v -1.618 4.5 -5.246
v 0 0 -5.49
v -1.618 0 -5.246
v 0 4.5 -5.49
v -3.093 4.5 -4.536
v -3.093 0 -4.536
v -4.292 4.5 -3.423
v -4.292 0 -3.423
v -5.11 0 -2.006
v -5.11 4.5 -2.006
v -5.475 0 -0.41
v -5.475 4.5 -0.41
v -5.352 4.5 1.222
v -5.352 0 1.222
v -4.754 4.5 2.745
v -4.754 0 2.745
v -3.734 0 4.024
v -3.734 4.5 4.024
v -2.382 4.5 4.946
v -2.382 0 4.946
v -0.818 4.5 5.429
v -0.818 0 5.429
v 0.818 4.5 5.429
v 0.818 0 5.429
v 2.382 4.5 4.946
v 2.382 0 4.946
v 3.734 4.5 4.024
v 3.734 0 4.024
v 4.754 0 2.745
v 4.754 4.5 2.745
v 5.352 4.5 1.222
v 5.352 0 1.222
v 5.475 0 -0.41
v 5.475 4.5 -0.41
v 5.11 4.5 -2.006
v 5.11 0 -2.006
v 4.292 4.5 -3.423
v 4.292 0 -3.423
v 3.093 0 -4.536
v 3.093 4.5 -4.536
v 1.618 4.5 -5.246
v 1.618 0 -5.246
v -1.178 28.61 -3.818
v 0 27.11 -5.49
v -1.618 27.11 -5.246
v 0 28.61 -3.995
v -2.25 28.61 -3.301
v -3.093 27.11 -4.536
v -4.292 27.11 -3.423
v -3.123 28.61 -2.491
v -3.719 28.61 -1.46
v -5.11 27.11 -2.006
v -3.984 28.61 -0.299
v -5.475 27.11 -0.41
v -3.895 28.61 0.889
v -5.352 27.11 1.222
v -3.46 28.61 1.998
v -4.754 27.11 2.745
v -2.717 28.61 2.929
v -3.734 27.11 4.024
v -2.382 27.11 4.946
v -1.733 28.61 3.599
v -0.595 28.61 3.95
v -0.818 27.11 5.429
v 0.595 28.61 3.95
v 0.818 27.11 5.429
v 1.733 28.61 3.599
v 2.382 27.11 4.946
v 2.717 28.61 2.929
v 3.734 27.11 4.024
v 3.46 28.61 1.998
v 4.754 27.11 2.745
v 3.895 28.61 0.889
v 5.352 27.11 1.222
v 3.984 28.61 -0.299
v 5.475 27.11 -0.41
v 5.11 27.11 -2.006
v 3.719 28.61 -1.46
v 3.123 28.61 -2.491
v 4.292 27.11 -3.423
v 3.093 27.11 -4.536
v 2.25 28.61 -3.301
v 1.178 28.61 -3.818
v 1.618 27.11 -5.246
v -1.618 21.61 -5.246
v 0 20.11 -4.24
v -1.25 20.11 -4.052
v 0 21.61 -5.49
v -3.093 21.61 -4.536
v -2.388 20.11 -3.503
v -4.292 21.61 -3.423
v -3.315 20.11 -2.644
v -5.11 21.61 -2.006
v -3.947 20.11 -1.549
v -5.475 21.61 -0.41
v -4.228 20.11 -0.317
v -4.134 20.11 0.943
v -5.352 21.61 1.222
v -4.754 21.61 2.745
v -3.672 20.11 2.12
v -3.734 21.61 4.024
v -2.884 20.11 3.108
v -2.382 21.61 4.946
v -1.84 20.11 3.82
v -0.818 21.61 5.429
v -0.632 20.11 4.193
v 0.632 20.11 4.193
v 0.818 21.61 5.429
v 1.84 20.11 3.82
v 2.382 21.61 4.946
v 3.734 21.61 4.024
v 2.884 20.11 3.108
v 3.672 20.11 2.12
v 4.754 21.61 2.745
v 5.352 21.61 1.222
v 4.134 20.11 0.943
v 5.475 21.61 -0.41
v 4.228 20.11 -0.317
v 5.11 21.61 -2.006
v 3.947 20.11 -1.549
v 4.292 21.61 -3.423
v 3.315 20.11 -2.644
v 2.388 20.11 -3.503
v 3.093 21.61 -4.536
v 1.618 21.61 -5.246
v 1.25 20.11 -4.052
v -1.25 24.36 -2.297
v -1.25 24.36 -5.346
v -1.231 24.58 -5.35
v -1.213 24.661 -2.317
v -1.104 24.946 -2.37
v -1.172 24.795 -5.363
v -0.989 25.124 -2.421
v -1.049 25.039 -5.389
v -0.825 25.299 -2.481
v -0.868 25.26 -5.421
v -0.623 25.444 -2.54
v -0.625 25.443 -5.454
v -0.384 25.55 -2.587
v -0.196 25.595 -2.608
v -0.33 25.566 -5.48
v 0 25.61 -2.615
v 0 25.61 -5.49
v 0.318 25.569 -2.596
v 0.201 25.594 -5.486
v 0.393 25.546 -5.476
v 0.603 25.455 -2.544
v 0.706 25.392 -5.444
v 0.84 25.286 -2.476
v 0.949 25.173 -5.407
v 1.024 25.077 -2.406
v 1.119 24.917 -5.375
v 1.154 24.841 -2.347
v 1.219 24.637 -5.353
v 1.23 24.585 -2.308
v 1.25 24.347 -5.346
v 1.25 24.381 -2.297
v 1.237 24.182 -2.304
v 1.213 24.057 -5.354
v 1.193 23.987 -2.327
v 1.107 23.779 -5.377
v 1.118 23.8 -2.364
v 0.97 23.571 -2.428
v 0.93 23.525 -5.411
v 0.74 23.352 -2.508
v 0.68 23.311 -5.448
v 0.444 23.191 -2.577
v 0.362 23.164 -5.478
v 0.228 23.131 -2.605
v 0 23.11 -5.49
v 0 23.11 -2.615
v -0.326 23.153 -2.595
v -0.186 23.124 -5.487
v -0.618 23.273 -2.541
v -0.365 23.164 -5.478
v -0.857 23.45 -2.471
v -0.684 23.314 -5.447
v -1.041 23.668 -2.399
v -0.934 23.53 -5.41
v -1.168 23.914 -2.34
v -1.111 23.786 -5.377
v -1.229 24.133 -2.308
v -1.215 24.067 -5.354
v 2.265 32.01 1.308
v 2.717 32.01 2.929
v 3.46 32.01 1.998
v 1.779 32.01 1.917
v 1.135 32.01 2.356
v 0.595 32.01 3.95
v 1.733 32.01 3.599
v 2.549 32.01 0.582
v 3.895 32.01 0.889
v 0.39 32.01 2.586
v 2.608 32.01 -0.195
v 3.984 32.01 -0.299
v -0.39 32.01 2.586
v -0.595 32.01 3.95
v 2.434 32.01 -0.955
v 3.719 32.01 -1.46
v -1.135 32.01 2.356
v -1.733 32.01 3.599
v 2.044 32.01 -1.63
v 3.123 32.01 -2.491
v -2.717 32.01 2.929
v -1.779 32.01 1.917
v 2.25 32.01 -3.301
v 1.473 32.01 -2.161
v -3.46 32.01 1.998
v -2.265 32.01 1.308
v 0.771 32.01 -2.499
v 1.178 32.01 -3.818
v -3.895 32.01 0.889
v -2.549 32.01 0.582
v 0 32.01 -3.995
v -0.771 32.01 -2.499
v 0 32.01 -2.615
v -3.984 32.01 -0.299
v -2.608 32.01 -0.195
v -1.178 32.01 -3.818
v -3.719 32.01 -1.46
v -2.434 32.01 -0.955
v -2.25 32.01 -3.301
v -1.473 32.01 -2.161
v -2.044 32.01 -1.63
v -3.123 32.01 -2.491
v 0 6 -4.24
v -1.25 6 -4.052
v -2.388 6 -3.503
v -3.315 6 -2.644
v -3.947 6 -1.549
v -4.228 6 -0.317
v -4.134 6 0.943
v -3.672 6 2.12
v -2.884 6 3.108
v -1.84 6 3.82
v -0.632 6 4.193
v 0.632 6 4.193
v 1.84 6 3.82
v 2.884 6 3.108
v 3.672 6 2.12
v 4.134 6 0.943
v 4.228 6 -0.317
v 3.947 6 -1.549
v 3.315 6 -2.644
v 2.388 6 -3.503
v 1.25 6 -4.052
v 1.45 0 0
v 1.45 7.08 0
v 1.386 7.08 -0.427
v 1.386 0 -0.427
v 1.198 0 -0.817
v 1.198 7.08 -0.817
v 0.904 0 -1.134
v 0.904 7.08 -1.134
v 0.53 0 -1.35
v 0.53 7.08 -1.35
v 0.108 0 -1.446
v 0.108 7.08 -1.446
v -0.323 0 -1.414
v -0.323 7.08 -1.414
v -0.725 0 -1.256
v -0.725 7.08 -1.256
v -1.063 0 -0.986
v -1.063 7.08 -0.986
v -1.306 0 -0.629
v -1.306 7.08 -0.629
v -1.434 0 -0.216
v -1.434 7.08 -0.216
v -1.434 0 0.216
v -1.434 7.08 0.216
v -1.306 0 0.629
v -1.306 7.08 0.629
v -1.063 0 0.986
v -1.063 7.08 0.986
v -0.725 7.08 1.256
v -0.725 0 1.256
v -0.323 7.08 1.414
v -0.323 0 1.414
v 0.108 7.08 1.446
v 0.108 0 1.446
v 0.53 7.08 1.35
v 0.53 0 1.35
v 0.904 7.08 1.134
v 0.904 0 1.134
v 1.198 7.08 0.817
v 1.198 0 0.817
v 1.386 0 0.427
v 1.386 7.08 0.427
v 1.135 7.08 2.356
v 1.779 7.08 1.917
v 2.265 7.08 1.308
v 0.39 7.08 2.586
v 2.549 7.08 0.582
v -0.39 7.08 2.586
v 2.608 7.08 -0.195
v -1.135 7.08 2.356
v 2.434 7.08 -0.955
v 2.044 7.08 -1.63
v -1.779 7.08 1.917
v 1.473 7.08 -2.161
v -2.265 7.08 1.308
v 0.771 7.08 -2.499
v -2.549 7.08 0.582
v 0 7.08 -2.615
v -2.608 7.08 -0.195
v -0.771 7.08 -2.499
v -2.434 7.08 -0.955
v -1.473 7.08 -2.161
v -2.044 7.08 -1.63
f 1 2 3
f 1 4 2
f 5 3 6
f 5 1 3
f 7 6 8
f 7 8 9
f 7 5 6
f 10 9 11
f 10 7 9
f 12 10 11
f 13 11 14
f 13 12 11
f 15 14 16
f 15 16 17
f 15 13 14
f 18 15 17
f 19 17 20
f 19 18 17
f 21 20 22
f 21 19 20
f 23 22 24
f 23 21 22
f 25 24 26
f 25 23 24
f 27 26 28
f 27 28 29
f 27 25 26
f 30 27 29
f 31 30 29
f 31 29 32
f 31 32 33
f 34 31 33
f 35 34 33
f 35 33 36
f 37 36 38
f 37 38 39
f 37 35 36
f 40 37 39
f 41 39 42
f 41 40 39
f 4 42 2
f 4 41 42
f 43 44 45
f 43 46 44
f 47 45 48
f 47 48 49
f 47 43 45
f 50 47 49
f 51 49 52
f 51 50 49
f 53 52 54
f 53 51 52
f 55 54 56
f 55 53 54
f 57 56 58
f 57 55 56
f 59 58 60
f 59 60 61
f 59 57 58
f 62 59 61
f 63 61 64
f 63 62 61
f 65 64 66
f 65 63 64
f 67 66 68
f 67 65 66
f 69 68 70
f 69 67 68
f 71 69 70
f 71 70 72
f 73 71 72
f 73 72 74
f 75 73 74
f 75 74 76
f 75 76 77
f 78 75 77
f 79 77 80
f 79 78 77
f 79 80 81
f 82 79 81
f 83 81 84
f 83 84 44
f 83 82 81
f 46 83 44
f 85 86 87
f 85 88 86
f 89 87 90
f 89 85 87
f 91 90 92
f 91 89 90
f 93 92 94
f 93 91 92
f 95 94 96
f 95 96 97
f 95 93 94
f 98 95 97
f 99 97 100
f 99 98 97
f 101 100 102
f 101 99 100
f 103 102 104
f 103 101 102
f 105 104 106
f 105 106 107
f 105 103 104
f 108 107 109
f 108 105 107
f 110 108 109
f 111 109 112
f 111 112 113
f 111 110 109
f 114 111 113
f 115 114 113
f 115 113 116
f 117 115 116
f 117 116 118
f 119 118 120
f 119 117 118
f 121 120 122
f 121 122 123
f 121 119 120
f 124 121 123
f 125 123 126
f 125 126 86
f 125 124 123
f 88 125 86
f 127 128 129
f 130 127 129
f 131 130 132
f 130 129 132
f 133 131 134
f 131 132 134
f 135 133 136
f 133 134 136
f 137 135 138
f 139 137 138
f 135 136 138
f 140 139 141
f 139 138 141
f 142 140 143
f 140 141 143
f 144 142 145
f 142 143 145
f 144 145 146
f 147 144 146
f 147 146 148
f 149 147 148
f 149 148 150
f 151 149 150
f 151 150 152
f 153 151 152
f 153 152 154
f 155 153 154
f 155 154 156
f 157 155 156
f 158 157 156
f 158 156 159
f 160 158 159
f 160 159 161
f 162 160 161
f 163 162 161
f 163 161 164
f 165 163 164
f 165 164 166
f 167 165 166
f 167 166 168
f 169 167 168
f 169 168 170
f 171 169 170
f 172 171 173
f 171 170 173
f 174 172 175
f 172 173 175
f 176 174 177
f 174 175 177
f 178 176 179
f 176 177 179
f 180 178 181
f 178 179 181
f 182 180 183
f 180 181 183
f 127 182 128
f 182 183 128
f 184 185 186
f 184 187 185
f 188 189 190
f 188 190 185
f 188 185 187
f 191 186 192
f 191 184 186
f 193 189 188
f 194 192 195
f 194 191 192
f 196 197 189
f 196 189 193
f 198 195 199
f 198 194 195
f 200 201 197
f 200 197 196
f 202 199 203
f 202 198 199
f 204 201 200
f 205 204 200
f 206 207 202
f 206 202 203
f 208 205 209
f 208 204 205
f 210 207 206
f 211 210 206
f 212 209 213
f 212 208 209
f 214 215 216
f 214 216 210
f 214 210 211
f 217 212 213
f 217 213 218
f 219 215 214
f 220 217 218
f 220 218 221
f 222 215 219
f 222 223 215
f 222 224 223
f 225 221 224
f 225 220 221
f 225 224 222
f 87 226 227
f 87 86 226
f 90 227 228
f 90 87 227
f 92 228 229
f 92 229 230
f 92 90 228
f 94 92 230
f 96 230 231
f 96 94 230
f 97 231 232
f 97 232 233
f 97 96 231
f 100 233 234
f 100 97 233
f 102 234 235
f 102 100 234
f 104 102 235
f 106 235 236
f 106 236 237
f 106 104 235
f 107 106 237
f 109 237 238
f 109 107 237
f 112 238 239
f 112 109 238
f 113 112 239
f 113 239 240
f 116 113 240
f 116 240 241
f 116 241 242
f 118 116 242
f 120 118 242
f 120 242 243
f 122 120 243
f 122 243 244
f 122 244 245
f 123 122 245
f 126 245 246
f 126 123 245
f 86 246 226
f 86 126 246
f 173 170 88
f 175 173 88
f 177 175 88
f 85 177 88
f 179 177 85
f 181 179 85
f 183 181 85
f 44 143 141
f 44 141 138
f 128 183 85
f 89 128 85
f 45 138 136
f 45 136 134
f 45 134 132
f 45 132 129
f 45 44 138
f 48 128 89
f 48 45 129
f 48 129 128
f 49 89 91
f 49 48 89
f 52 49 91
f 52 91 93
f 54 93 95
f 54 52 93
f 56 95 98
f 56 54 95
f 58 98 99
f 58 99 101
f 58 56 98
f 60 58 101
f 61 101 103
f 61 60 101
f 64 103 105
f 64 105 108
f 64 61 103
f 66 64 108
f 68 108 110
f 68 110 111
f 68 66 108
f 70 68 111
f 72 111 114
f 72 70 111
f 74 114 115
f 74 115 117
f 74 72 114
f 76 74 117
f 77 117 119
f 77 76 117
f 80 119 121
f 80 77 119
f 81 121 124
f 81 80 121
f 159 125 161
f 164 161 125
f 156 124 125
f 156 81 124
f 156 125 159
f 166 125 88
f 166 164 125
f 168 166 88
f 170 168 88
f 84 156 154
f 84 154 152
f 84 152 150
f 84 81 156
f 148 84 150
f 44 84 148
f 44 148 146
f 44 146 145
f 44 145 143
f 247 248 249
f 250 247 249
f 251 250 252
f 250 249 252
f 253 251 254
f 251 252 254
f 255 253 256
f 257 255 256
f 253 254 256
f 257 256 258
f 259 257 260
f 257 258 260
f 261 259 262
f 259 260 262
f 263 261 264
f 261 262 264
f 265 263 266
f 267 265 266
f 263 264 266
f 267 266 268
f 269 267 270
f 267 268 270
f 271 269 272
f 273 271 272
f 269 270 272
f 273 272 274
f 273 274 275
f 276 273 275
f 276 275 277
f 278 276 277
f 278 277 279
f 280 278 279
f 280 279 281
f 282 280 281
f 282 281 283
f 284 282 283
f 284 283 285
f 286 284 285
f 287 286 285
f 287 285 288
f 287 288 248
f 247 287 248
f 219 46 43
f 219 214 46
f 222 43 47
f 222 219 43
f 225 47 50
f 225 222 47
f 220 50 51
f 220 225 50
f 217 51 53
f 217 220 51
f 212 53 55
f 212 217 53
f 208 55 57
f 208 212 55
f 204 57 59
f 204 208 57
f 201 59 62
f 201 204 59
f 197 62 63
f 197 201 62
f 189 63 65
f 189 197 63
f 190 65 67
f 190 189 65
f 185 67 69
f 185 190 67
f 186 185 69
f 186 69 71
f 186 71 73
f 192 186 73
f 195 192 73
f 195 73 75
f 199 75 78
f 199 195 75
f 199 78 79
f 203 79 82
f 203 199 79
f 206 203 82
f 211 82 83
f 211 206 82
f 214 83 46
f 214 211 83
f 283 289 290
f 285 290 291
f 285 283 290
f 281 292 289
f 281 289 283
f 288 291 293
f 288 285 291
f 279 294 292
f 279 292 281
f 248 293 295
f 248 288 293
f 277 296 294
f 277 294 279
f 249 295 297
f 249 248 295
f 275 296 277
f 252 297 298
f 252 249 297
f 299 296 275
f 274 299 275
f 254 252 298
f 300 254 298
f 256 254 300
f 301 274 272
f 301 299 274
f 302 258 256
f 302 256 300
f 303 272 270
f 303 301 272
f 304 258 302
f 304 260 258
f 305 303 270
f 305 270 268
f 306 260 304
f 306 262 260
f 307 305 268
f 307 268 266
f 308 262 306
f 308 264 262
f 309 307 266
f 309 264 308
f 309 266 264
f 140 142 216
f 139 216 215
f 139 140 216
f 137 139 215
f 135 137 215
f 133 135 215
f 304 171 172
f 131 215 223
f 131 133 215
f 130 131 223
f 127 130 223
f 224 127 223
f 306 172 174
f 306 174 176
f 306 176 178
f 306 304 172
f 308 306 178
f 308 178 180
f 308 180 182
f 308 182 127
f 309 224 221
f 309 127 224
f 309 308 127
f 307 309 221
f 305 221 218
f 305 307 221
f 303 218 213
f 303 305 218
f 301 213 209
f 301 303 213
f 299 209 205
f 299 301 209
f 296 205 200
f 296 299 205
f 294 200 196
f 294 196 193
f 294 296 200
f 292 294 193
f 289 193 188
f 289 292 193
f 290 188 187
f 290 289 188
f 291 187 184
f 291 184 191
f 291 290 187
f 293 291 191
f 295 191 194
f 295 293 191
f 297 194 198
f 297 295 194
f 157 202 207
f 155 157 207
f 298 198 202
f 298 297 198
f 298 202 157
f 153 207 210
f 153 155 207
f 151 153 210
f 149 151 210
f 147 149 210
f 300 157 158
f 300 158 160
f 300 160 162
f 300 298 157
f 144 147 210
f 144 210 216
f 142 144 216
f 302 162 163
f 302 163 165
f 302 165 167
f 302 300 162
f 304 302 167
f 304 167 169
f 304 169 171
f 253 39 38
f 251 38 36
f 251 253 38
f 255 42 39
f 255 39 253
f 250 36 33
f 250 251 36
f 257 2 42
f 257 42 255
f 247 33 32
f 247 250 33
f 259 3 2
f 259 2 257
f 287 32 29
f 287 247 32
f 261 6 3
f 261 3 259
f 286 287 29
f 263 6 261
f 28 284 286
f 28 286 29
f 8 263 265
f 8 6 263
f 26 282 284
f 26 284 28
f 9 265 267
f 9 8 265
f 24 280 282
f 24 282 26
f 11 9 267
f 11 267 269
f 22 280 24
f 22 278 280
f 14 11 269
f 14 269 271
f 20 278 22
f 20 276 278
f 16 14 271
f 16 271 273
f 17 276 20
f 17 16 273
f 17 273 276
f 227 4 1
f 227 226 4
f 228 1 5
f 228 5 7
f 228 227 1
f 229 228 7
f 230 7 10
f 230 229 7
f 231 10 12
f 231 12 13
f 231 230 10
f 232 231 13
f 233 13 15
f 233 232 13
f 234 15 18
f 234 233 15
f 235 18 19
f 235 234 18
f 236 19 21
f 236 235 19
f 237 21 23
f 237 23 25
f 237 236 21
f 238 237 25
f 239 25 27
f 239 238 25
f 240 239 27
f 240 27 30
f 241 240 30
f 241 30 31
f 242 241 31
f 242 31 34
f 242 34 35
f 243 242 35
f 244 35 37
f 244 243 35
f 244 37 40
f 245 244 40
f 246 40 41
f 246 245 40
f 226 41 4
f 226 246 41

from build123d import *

# Parameters (mm, degrees)
FORO_FILETTATO_M3_5X0_6_1_D    = 2.9
FORO_FILETTATO_M3X0_5_2_REACH  = 36.283
FORO_FILETTATO_M3X0_5_2_BORE_R = 1.25


with BuildPart() as part:
    # Schizzo1 → Rivoluzione1 (revolve)
    with BuildSketch(Plane.XY, mode=Mode.PRIVATE) as rivoluzione1_sk:
        Polygon((0, 0), (5.49, 0), (5.49, 4.5), (4.24, 6), (4.24, 20.11), (5.49, 21.61), (5.49, 27.11), (3.995, 28.61), (3.995, 32.01), (2.615, 32.01), (2.615, 7.08), (0, 7.08), align=None)
    revolve(rivoluzione1_sk.sketch.rotate(Axis((0, 0, 0), (0, 1, 0)), 90), axis=Axis((0, 0, 0), (0, 1, 0)))

    # Foro filettato M3.5x0.6-1 (through all)
    with Locations(Plane(origin=(0, 0, 0), x_dir=(-1, 0, 0), z_dir=(0, -1, 0))):
        with Locations((0, 0)):
            Hole(FORO_FILETTATO_M3_5X0_6_1_D / 2)

    # Foro filettato M3x0.5-2 bore → Foro filettato M3x0.5-2 (cut, up to next)
    with BuildSketch(Plane(origin=(0, 0, -5.49), x_dir=(-1, 0, 0), z_dir=(0, 0, -1)), mode=Mode.PRIVATE) as foro_filettato_m3x0_5_2_sk1:
        with Locations((0, 24.36)):
            Circle(FORO_FILETTATO_M3X0_5_2_BORE_R)
    foro_filettato_m3x0_5_2_tool1 = extrude(foro_filettato_m3x0_5_2_sk1.sketch, amount=-FORO_FILETTATO_M3X0_5_2_REACH, mode=Mode.PRIVATE) & part.part
    add(foro_filettato_m3x0_5_2_tool1.solids().sort_by_distance((0, 24.36, -5.49))[0], mode=Mode.SUBTRACT)


solid = part.part
